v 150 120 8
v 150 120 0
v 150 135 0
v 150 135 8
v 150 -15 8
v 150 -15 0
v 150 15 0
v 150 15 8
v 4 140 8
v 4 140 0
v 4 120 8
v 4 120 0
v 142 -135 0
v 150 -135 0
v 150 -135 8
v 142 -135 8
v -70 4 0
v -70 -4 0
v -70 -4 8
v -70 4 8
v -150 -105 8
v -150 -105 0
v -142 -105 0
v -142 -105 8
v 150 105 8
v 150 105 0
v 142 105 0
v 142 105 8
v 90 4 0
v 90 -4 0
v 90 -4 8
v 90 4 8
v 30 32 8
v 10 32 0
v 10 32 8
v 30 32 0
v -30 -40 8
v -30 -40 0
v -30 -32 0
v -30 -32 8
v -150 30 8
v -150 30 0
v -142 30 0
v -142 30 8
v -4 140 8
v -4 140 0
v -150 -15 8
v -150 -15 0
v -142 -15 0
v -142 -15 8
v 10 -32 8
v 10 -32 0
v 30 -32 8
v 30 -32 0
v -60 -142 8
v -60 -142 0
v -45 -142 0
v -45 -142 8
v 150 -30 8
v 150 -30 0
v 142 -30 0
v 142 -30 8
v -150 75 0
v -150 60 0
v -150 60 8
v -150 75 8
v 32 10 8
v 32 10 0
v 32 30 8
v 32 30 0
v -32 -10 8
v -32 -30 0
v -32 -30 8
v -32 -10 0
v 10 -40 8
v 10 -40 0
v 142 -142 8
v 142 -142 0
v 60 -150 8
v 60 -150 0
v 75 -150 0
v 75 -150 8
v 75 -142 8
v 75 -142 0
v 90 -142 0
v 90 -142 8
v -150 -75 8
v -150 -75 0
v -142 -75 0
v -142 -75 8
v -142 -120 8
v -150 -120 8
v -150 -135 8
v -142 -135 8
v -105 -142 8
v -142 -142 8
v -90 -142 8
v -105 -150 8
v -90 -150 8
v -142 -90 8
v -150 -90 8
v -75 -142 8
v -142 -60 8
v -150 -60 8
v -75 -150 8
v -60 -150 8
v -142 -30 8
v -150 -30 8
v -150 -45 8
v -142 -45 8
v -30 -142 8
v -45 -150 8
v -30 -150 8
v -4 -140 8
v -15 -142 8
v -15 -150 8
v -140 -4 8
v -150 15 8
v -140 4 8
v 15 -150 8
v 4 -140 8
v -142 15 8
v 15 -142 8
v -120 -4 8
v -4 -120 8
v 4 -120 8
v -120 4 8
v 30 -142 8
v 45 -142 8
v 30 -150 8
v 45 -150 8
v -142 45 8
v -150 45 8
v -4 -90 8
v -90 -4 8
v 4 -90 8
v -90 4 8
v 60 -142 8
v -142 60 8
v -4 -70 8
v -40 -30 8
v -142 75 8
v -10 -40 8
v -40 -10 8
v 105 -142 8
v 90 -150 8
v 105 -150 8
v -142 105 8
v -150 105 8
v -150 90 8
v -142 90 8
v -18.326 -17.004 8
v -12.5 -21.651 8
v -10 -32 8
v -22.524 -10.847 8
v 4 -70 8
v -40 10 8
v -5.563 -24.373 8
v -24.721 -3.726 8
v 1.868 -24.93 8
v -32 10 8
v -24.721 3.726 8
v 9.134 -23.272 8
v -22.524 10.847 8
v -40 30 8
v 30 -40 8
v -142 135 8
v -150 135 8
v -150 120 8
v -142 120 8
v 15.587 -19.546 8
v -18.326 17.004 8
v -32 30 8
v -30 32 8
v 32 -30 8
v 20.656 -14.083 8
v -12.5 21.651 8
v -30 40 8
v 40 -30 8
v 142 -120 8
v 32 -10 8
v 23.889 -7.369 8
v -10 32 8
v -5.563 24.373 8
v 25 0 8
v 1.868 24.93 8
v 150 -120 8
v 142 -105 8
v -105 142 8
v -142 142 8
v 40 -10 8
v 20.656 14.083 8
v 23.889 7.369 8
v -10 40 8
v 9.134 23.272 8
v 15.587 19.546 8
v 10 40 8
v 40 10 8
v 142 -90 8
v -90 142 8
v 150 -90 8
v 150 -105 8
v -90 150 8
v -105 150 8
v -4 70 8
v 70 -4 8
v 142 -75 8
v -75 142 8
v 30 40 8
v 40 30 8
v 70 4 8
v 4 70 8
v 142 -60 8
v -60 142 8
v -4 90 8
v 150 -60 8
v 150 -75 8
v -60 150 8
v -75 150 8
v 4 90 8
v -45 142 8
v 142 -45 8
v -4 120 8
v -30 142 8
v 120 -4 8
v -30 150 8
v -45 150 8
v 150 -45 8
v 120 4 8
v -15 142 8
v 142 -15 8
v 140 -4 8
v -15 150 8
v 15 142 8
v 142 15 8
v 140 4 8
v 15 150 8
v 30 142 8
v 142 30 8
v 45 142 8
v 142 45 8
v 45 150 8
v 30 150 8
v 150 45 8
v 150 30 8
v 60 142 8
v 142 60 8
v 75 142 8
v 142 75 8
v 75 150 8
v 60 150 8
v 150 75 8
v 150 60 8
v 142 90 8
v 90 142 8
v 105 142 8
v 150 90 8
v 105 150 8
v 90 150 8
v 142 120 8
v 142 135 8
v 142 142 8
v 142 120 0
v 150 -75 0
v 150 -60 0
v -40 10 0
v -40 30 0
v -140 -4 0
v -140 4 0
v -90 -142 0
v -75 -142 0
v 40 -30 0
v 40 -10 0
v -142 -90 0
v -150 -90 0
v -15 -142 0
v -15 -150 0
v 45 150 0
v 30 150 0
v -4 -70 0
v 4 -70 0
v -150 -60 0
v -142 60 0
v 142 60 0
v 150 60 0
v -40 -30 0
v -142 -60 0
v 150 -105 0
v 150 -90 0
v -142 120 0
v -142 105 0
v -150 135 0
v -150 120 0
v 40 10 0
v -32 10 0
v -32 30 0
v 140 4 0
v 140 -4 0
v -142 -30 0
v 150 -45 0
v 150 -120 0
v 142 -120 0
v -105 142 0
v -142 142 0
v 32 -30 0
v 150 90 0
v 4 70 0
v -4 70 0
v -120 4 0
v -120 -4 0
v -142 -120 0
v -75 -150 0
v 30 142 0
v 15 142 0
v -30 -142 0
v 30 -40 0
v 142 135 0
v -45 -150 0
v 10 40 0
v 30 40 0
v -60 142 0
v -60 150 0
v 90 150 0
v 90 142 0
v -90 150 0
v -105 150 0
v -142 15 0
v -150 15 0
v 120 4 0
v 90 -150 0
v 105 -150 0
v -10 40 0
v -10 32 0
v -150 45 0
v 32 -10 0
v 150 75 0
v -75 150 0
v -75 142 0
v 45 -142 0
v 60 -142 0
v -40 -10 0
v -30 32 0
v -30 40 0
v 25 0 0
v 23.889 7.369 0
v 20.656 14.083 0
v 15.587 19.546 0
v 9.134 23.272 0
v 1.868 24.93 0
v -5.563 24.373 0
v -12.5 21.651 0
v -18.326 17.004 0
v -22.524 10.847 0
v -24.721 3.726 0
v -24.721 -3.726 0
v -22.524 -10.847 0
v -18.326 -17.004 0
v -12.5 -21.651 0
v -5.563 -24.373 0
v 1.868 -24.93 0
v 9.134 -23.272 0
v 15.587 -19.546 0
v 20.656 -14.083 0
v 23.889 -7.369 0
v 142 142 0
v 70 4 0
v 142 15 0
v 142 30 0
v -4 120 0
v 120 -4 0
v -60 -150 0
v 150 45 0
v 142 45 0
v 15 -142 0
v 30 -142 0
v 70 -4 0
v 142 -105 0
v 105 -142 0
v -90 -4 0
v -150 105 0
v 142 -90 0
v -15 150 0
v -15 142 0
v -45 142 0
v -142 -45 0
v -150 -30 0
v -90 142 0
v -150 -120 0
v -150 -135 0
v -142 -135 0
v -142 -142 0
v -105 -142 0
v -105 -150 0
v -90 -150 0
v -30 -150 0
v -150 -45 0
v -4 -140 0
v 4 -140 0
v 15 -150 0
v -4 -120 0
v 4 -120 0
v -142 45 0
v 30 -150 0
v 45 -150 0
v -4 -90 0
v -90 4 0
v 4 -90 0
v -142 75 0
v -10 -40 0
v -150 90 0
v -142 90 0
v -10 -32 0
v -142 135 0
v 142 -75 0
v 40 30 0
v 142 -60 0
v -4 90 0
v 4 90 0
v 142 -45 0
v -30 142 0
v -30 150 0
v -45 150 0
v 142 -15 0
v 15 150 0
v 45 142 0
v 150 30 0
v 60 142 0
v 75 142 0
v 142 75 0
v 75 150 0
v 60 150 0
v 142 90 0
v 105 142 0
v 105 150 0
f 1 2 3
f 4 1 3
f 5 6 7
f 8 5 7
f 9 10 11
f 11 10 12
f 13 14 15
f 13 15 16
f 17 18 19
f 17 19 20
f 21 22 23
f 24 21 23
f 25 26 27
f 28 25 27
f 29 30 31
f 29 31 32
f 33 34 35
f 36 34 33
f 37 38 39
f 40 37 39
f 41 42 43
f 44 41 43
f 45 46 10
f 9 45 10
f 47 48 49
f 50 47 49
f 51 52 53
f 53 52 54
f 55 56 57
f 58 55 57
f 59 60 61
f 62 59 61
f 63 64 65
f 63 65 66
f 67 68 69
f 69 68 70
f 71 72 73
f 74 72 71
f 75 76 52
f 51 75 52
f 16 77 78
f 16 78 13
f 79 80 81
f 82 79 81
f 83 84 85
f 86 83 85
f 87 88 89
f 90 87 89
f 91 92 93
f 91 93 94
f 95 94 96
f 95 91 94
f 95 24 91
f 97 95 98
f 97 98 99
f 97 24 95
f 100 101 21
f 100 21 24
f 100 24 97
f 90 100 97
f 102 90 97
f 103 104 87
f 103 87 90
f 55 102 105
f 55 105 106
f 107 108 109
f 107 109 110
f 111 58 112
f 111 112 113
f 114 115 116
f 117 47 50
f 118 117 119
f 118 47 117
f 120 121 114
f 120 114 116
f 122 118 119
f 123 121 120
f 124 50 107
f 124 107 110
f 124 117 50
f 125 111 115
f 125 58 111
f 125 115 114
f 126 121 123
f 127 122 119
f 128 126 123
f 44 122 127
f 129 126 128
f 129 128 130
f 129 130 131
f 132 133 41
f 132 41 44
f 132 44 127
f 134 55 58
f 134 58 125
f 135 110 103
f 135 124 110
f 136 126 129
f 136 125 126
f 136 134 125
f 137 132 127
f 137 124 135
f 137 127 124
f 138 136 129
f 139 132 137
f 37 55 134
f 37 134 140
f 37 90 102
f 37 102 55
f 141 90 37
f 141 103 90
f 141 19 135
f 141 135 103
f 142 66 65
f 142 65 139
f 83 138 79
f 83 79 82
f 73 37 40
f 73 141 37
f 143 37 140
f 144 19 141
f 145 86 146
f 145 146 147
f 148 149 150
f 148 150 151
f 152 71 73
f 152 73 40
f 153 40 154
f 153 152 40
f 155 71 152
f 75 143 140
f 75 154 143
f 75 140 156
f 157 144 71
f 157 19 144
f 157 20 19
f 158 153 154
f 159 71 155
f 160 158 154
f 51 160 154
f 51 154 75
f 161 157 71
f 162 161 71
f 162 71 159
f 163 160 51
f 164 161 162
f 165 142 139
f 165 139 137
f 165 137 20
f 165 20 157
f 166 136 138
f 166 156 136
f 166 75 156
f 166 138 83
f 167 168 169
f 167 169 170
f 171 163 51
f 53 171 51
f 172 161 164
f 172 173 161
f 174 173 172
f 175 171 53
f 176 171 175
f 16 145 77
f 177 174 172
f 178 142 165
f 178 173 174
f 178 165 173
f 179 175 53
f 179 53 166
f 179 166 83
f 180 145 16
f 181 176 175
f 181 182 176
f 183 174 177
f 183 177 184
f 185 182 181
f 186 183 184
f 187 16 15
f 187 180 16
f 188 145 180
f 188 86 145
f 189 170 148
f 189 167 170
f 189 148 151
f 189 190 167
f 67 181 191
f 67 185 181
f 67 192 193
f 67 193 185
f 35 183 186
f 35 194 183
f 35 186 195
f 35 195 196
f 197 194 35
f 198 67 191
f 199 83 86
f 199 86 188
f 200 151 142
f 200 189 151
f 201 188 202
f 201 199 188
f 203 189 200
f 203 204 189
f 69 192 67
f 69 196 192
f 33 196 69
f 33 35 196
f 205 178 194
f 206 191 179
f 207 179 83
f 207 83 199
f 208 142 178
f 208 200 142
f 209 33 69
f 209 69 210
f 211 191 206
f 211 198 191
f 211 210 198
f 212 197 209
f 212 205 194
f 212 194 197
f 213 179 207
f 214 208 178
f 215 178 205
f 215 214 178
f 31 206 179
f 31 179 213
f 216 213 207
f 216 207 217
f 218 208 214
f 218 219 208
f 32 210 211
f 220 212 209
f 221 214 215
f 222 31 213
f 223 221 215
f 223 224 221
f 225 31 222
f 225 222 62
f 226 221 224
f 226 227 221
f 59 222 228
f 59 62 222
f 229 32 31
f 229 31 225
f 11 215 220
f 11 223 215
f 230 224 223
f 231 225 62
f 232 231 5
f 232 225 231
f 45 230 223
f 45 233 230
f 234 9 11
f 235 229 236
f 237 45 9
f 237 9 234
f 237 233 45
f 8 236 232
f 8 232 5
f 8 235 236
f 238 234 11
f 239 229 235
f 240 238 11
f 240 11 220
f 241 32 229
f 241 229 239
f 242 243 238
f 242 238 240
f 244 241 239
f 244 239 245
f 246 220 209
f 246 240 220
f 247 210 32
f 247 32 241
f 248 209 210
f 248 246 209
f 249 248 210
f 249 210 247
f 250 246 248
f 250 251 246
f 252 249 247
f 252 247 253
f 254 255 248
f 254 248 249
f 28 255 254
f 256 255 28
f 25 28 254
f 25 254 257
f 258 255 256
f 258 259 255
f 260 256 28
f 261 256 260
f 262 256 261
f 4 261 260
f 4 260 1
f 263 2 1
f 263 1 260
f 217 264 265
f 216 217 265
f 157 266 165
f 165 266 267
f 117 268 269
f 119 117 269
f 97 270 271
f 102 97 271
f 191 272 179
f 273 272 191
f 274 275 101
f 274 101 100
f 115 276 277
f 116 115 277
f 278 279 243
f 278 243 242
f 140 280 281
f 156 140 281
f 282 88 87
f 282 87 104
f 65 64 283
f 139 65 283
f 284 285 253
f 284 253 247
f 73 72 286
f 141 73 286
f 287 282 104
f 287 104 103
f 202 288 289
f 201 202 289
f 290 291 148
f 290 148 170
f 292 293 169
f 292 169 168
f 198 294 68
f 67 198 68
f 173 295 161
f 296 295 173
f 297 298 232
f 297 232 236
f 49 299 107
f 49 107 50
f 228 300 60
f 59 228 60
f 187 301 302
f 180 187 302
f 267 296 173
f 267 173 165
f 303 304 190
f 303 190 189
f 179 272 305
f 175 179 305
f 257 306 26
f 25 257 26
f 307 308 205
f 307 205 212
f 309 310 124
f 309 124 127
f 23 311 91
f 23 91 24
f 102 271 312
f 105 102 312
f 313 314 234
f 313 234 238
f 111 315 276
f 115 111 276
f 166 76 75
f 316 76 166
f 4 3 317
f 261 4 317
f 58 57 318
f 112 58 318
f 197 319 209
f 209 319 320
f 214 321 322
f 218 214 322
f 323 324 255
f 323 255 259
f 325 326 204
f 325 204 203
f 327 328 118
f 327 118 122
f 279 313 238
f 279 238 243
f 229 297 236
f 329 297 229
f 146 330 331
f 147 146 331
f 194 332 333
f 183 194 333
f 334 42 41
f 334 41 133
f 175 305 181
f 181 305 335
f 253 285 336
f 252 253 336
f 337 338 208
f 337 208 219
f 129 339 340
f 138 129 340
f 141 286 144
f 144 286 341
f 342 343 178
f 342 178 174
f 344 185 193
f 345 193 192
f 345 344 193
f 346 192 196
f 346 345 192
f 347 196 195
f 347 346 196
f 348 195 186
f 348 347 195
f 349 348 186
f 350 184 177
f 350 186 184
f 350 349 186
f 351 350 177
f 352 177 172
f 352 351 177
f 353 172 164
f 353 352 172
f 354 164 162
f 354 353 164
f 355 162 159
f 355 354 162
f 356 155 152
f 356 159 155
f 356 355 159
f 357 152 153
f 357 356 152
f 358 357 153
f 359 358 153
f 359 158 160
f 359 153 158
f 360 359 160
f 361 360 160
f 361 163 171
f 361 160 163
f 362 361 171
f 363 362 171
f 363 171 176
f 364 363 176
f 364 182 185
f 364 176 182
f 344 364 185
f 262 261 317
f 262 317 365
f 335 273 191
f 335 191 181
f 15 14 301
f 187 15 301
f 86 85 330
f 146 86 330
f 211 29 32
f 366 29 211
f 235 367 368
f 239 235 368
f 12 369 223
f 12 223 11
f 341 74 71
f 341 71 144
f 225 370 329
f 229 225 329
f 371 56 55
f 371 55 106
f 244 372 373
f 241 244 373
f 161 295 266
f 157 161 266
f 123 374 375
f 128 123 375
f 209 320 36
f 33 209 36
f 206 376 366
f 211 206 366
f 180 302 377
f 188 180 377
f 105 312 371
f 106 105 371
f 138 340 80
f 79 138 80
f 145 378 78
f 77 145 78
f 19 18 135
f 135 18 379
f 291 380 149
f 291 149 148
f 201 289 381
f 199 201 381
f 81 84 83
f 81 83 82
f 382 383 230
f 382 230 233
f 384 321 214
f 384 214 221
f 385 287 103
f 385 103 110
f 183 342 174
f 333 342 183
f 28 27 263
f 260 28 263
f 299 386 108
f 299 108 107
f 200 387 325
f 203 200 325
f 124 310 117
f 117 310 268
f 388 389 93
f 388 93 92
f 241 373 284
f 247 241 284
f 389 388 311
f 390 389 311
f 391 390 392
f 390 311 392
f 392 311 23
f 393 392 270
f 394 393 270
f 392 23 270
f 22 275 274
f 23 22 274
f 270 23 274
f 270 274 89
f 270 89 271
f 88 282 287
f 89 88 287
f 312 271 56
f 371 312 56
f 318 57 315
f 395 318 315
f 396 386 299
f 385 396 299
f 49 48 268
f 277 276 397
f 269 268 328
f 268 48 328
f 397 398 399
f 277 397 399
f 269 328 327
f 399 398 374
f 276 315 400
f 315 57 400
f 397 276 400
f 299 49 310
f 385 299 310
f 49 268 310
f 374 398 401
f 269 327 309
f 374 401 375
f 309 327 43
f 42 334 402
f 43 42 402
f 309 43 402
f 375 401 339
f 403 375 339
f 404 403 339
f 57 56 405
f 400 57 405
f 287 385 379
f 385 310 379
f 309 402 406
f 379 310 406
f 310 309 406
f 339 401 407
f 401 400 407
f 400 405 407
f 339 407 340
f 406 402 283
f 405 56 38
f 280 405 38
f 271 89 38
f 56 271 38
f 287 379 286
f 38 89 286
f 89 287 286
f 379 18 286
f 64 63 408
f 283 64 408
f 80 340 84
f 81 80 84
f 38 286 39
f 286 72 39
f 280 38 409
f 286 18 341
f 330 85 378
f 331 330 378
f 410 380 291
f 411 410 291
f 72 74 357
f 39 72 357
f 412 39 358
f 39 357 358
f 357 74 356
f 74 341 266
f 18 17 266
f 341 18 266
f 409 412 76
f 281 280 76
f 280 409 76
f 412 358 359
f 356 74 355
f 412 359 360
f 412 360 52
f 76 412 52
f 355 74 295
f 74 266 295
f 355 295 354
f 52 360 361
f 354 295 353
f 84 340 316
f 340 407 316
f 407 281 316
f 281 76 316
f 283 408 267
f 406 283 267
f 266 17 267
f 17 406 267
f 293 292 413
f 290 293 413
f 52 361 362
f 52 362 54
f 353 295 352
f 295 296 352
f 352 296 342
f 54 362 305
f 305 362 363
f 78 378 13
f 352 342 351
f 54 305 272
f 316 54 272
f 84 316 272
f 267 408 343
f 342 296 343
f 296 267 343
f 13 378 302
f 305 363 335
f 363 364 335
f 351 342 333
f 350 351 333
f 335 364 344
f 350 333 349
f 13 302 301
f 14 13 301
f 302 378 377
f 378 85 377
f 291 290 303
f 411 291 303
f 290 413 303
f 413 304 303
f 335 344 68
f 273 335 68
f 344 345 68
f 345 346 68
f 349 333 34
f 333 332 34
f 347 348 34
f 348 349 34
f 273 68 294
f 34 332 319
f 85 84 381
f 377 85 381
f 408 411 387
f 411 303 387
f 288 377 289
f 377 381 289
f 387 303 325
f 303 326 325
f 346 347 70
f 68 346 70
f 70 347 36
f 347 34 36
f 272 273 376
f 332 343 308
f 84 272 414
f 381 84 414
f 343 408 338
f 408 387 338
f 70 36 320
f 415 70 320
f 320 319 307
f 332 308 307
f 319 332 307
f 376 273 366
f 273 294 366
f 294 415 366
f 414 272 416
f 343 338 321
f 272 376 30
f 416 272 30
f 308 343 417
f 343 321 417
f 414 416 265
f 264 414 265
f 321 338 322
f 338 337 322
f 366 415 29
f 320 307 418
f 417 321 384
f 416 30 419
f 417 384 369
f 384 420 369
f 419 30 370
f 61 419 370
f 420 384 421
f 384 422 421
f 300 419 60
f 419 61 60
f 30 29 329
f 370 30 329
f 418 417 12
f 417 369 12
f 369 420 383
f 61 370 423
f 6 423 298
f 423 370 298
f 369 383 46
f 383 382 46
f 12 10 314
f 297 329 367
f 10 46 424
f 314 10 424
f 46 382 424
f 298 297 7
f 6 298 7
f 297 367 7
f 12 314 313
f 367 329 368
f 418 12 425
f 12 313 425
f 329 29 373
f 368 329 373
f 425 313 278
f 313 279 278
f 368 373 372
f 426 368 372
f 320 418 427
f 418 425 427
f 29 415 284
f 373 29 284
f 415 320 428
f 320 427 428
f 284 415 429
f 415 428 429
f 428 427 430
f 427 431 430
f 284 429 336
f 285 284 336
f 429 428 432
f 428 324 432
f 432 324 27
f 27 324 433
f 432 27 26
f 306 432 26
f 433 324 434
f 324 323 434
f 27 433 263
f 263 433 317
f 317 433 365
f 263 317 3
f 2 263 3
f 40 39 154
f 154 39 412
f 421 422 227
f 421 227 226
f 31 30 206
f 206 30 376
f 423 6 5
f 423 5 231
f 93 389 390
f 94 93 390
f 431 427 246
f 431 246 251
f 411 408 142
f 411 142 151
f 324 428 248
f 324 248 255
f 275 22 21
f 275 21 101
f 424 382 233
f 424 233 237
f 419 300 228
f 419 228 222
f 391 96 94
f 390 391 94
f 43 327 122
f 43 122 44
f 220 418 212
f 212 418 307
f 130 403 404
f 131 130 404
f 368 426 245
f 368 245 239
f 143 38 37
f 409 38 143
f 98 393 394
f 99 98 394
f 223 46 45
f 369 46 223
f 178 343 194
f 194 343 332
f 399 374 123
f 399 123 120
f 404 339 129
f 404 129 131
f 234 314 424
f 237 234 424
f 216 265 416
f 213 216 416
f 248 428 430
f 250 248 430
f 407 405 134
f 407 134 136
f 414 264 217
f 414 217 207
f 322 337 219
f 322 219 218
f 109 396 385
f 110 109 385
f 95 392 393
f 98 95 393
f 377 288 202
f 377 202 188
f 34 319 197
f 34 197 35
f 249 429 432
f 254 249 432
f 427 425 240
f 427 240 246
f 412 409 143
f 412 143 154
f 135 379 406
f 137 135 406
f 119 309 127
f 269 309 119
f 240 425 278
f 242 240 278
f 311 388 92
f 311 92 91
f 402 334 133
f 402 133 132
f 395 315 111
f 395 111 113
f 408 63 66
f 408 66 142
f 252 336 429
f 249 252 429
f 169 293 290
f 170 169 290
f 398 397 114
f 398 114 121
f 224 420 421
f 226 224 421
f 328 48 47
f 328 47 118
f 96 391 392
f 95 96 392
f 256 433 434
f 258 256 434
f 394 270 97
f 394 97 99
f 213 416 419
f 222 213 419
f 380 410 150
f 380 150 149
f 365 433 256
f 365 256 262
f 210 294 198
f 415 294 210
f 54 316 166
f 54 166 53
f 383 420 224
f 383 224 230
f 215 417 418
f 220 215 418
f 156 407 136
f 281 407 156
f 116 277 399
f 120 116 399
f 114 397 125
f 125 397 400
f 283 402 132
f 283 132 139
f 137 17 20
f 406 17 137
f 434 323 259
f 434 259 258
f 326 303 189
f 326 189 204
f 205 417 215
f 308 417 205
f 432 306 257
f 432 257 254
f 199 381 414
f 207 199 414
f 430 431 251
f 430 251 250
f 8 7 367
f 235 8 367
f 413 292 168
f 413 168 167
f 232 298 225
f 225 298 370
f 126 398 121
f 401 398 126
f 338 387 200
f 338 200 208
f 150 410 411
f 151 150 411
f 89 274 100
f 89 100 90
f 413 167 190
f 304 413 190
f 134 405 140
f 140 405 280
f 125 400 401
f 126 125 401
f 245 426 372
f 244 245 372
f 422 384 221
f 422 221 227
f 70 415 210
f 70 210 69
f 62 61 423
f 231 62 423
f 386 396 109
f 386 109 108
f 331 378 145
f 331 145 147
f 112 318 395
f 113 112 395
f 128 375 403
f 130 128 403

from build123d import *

# Parameters (mm, degrees)
ESQUISSE1_W                  = 300
ESQUISSE1_H                  = 300
BOSS_EXTRU_1_DEPTH           = 8
ESQUISSE3_W                  = 8
ESQUISSE3_H                  = 15
ENL_V_MAT_EXTRU_4_DEPTH      = 213.282830205
ESQUISSE4_R                  = 25
ENL_V_MAT_EXTRU_5_DEPTH      = 213.282830205
ESQUISSE5_W                  = 15
ESQUISSE5_H                  = 8
ESQUISSE5_W_2                = 37
ENL_V_MAT_EXTRU_6_DEPTH      = 213.282830205
ESQUISSE6_W                  = 20
ESQUISSE6_H                  = 8
ENL_V_MAT_EXTRU_7_DEPTH      = 213.282830205
R_P_TITION_CIRCULAIRE1_COUNT = 2
R_P_TITION_CIRCULAIRE1_ANGLE = 90
SYM_TRIE4_COPY_1_SKETCH_W    = 20
SYM_TRIE4_COPY_1_SKETCH_H    = 8
SYM_TRIE4_COPY_1_DEPTH       = 213.282830205
SYM_TRIE4_COPY_2_SKETCH_W    = 20
SYM_TRIE4_COPY_2_SKETCH_H    = 8
SYM_TRIE4_COPY_2_DEPTH       = 213.282830205
ESQUISSE7_W                  = 8
ESQUISSE7_H                  = 20
ENL_V_MAT_EXTRU_8_DEPTH      = 213.282830205
R_P_TITION_CIRCULAIRE2_COUNT = 2
R_P_TITION_CIRCULAIRE2_ANGLE = 90
SYM_TRIE6_COPY_1_SKETCH_W    = 8
SYM_TRIE6_COPY_1_SKETCH_H    = 20
SYM_TRIE6_COPY_1_DEPTH       = 213.282830205
SYM_TRIE6_COPY_2_SKETCH_W    = 8
SYM_TRIE6_COPY_2_SKETCH_H    = 20
SYM_TRIE6_COPY_2_DEPTH       = 213.282830205


with BuildPart() as part:
    # Esquisse1 → Boss.-Extru.1 (new body)
    with BuildSketch(Plane.XY):
        Rectangle(ESQUISSE1_W, ESQUISSE1_H)
    extrude(amount=BOSS_EXTRU_1_DEPTH)

    # Esquisse3 → Enlèv. mat.-Extru.4 (cut, through all)
    with BuildSketch(Plane.XY):
        with Locations((-146, -22.5)):
            Rectangle(ESQUISSE3_W, ESQUISSE3_H)
        with Locations((-146, -52.5)):
            Rectangle(ESQUISSE3_W, ESQUISSE3_H)
        with Locations((-146, -82.5)):
            Rectangle(ESQUISSE3_W, ESQUISSE3_H)
        with Locations((-146, -112.5)):
            Rectangle(ESQUISSE3_W, ESQUISSE3_H)
        with Locations((-146, -142.5)):
            Rectangle(ESQUISSE3_W, ESQUISSE3_H)
        with Locations((-146, 52.5)):
            Rectangle(ESQUISSE3_W, ESQUISSE3_H)
        with Locations((-146, 142.5)):
            Rectangle(ESQUISSE3_W, ESQUISSE3_H)
        with Locations((-146, 112.5)):
            Rectangle(ESQUISSE3_W, ESQUISSE3_H)
        with Locations((-146, 82.5)):
            Rectangle(ESQUISSE3_W, ESQUISSE3_H)
        with Locations((-146, 22.5)):
            Rectangle(ESQUISSE3_W, ESQUISSE3_H)
    enl_v_mat_extru_4 = extrude(amount=ENL_V_MAT_EXTRU_4_DEPTH, mode=Mode.SUBTRACT)

    # Symétrie1: Enlèv. mat.-Extru.4 across plane
    add(enl_v_mat_extru_4.mirror(Plane(origin=(0, 0, 0), x_dir=(0, 0, 1), z_dir=(1, 0, 0))), mode=Mode.SUBTRACT)

    # Esquisse4 → Enlèv. mat.-Extru.5 (cut, through all)
    with BuildSketch(Plane.XY):
        Circle(ESQUISSE4_R)
    extrude(amount=ENL_V_MAT_EXTRU_5_DEPTH, mode=Mode.SUBTRACT)

    # Esquisse5 → Enlèv. mat.-Extru.6 (cut, through all)
    with BuildSketch(Plane.XY):
        with Locations((22.5, 146)):
            Rectangle(ESQUISSE5_W, ESQUISSE5_H)
        with Locations((-22.5, 146)):
            Rectangle(ESQUISSE5_W, ESQUISSE5_H)
        with Locations((-52.5, 146)):
            Rectangle(ESQUISSE5_W, ESQUISSE5_H)
        with Locations((-82.5, 146)):
            Rectangle(ESQUISSE5_W, ESQUISSE5_H)
        with Locations((-123.5, 146)):
            Rectangle(ESQUISSE5_W_2, ESQUISSE5_H)
        with Locations((52.5, 146)):
            Rectangle(ESQUISSE5_W, ESQUISSE5_H)
        with Locations((82.5, 146)):
            Rectangle(ESQUISSE5_W, ESQUISSE5_H)
        with Locations((123.5, 146)):
            Rectangle(ESQUISSE5_W_2, ESQUISSE5_H)
    enl_v_mat_extru_6 = extrude(amount=ENL_V_MAT_EXTRU_6_DEPTH, mode=Mode.SUBTRACT)

    # Symétrie2: Enlèv. mat.-Extru.6 across plane
    add(enl_v_mat_extru_6.mirror(Plane.ZX), mode=Mode.SUBTRACT)

    # Esquisse6 → Enlèv. mat.-Extru.7 (cut, through all)
    with BuildSketch(Plane.XY):
        with Locations((-20, -36)):
            Rectangle(ESQUISSE6_W, ESQUISSE6_H)
        with Locations((20, -36)):
            Rectangle(ESQUISSE6_W, ESQUISSE6_H)
    enl_v_mat_extru_7 = extrude(amount=ENL_V_MAT_EXTRU_7_DEPTH, mode=Mode.SUBTRACT)

    # Symétrie3: Enlèv. mat.-Extru.7 across plane
    add(enl_v_mat_extru_7.mirror(Plane.ZX), mode=Mode.SUBTRACT)

    # Répétition circulaire1: Enlèv. mat.-Extru.7 ×2 about axis
    r_p_tition_circulaire1_axis = Axis((0, 0, 0), (0, 0, 1))
    for i in range(1, R_P_TITION_CIRCULAIRE1_COUNT):
        add(enl_v_mat_extru_7.rotate(r_p_tition_circulaire1_axis, i * R_P_TITION_CIRCULAIRE1_ANGLE / (R_P_TITION_CIRCULAIRE1_COUNT - 1)), mode=Mode.SUBTRACT)

    # Symétrie4 copy 1 sketch → Symétrie4 copy 1 (cut, through all)
    with BuildSketch(Plane(origin=(0, 0, 0), x_dir=(0, 1, 0), z_dir=(0, 0, 1))):
        with Locations((-20, 36)):
            Rectangle(SYM_TRIE4_COPY_1_SKETCH_W, SYM_TRIE4_COPY_1_SKETCH_H)
        with Locations((20, 36)):
            Rectangle(SYM_TRIE4_COPY_1_SKETCH_W, SYM_TRIE4_COPY_1_SKETCH_H)
    extrude(amount=SYM_TRIE4_COPY_1_DEPTH, mode=Mode.SUBTRACT)

    # Symétrie4 copy 2 sketch → Symétrie4 copy 2 (cut, through all)
    with BuildSketch(Plane(origin=(0, 0, 0), x_dir=(-1, 0, 0), z_dir=(0, 0, 1))):
        with Locations((-20, 36)):
            Rectangle(SYM_TRIE4_COPY_2_SKETCH_W, SYM_TRIE4_COPY_2_SKETCH_H)
        with Locations((20, 36)):
            Rectangle(SYM_TRIE4_COPY_2_SKETCH_W, SYM_TRIE4_COPY_2_SKETCH_H)
    extrude(amount=SYM_TRIE4_COPY_2_DEPTH, mode=Mode.SUBTRACT)

    # Esquisse7 → Enlèv. mat.-Extru.8 (cut, through all)
    with BuildSketch(Plane.XY):
        with Locations((0, -130)):
            Rectangle(ESQUISSE7_W, ESQUISSE7_H)
        with Locations((0, -80)):
            Rectangle(ESQUISSE7_W, ESQUISSE7_H)
    enl_v_mat_extru_8 = extrude(amount=ENL_V_MAT_EXTRU_8_DEPTH, mode=Mode.SUBTRACT)

    # Symétrie5: Enlèv. mat.-Extru.8 across plane
    add(enl_v_mat_extru_8.mirror(Plane.ZX), mode=Mode.SUBTRACT)

    # Répétition circulaire2: Enlèv. mat.-Extru.8 ×2 about axis
    r_p_tition_circulaire2_axis = Axis((0, 0, 0), (0, 0, 1))
    for i in range(1, R_P_TITION_CIRCULAIRE2_COUNT):
        add(enl_v_mat_extru_8.rotate(r_p_tition_circulaire2_axis, i * R_P_TITION_CIRCULAIRE2_ANGLE / (R_P_TITION_CIRCULAIRE2_COUNT - 1)), mode=Mode.SUBTRACT)

    # Symétrie6 copy 1 sketch → Symétrie6 copy 1 (cut, through all)
    with BuildSketch(Plane(origin=(0, 0, 0), x_dir=(0, 1, 0), z_dir=(0, 0, 1))):
        with Locations((0, 130)):
            Rectangle(SYM_TRIE6_COPY_1_SKETCH_W, SYM_TRIE6_COPY_1_SKETCH_H)
        with Locations((0, 80)):
            Rectangle(SYM_TRIE6_COPY_1_SKETCH_W, SYM_TRIE6_COPY_1_SKETCH_H)
    extrude(amount=SYM_TRIE6_COPY_1_DEPTH, mode=Mode.SUBTRACT)

    # Symétrie6 copy 2 sketch → Symétrie6 copy 2 (cut, through all)
    with BuildSketch(Plane(origin=(0, 0, 0), x_dir=(-1, 0, 0), z_dir=(0, 0, 1))):
        with Locations((0, 130)):
            Rectangle(SYM_TRIE6_COPY_2_SKETCH_W, SYM_TRIE6_COPY_2_SKETCH_H)
        with Locations((0, 80)):
            Rectangle(SYM_TRIE6_COPY_2_SKETCH_W, SYM_TRIE6_COPY_2_SKETCH_H)
    extrude(amount=SYM_TRIE6_COPY_2_DEPTH, mode=Mode.SUBTRACT)


solid = part.part
